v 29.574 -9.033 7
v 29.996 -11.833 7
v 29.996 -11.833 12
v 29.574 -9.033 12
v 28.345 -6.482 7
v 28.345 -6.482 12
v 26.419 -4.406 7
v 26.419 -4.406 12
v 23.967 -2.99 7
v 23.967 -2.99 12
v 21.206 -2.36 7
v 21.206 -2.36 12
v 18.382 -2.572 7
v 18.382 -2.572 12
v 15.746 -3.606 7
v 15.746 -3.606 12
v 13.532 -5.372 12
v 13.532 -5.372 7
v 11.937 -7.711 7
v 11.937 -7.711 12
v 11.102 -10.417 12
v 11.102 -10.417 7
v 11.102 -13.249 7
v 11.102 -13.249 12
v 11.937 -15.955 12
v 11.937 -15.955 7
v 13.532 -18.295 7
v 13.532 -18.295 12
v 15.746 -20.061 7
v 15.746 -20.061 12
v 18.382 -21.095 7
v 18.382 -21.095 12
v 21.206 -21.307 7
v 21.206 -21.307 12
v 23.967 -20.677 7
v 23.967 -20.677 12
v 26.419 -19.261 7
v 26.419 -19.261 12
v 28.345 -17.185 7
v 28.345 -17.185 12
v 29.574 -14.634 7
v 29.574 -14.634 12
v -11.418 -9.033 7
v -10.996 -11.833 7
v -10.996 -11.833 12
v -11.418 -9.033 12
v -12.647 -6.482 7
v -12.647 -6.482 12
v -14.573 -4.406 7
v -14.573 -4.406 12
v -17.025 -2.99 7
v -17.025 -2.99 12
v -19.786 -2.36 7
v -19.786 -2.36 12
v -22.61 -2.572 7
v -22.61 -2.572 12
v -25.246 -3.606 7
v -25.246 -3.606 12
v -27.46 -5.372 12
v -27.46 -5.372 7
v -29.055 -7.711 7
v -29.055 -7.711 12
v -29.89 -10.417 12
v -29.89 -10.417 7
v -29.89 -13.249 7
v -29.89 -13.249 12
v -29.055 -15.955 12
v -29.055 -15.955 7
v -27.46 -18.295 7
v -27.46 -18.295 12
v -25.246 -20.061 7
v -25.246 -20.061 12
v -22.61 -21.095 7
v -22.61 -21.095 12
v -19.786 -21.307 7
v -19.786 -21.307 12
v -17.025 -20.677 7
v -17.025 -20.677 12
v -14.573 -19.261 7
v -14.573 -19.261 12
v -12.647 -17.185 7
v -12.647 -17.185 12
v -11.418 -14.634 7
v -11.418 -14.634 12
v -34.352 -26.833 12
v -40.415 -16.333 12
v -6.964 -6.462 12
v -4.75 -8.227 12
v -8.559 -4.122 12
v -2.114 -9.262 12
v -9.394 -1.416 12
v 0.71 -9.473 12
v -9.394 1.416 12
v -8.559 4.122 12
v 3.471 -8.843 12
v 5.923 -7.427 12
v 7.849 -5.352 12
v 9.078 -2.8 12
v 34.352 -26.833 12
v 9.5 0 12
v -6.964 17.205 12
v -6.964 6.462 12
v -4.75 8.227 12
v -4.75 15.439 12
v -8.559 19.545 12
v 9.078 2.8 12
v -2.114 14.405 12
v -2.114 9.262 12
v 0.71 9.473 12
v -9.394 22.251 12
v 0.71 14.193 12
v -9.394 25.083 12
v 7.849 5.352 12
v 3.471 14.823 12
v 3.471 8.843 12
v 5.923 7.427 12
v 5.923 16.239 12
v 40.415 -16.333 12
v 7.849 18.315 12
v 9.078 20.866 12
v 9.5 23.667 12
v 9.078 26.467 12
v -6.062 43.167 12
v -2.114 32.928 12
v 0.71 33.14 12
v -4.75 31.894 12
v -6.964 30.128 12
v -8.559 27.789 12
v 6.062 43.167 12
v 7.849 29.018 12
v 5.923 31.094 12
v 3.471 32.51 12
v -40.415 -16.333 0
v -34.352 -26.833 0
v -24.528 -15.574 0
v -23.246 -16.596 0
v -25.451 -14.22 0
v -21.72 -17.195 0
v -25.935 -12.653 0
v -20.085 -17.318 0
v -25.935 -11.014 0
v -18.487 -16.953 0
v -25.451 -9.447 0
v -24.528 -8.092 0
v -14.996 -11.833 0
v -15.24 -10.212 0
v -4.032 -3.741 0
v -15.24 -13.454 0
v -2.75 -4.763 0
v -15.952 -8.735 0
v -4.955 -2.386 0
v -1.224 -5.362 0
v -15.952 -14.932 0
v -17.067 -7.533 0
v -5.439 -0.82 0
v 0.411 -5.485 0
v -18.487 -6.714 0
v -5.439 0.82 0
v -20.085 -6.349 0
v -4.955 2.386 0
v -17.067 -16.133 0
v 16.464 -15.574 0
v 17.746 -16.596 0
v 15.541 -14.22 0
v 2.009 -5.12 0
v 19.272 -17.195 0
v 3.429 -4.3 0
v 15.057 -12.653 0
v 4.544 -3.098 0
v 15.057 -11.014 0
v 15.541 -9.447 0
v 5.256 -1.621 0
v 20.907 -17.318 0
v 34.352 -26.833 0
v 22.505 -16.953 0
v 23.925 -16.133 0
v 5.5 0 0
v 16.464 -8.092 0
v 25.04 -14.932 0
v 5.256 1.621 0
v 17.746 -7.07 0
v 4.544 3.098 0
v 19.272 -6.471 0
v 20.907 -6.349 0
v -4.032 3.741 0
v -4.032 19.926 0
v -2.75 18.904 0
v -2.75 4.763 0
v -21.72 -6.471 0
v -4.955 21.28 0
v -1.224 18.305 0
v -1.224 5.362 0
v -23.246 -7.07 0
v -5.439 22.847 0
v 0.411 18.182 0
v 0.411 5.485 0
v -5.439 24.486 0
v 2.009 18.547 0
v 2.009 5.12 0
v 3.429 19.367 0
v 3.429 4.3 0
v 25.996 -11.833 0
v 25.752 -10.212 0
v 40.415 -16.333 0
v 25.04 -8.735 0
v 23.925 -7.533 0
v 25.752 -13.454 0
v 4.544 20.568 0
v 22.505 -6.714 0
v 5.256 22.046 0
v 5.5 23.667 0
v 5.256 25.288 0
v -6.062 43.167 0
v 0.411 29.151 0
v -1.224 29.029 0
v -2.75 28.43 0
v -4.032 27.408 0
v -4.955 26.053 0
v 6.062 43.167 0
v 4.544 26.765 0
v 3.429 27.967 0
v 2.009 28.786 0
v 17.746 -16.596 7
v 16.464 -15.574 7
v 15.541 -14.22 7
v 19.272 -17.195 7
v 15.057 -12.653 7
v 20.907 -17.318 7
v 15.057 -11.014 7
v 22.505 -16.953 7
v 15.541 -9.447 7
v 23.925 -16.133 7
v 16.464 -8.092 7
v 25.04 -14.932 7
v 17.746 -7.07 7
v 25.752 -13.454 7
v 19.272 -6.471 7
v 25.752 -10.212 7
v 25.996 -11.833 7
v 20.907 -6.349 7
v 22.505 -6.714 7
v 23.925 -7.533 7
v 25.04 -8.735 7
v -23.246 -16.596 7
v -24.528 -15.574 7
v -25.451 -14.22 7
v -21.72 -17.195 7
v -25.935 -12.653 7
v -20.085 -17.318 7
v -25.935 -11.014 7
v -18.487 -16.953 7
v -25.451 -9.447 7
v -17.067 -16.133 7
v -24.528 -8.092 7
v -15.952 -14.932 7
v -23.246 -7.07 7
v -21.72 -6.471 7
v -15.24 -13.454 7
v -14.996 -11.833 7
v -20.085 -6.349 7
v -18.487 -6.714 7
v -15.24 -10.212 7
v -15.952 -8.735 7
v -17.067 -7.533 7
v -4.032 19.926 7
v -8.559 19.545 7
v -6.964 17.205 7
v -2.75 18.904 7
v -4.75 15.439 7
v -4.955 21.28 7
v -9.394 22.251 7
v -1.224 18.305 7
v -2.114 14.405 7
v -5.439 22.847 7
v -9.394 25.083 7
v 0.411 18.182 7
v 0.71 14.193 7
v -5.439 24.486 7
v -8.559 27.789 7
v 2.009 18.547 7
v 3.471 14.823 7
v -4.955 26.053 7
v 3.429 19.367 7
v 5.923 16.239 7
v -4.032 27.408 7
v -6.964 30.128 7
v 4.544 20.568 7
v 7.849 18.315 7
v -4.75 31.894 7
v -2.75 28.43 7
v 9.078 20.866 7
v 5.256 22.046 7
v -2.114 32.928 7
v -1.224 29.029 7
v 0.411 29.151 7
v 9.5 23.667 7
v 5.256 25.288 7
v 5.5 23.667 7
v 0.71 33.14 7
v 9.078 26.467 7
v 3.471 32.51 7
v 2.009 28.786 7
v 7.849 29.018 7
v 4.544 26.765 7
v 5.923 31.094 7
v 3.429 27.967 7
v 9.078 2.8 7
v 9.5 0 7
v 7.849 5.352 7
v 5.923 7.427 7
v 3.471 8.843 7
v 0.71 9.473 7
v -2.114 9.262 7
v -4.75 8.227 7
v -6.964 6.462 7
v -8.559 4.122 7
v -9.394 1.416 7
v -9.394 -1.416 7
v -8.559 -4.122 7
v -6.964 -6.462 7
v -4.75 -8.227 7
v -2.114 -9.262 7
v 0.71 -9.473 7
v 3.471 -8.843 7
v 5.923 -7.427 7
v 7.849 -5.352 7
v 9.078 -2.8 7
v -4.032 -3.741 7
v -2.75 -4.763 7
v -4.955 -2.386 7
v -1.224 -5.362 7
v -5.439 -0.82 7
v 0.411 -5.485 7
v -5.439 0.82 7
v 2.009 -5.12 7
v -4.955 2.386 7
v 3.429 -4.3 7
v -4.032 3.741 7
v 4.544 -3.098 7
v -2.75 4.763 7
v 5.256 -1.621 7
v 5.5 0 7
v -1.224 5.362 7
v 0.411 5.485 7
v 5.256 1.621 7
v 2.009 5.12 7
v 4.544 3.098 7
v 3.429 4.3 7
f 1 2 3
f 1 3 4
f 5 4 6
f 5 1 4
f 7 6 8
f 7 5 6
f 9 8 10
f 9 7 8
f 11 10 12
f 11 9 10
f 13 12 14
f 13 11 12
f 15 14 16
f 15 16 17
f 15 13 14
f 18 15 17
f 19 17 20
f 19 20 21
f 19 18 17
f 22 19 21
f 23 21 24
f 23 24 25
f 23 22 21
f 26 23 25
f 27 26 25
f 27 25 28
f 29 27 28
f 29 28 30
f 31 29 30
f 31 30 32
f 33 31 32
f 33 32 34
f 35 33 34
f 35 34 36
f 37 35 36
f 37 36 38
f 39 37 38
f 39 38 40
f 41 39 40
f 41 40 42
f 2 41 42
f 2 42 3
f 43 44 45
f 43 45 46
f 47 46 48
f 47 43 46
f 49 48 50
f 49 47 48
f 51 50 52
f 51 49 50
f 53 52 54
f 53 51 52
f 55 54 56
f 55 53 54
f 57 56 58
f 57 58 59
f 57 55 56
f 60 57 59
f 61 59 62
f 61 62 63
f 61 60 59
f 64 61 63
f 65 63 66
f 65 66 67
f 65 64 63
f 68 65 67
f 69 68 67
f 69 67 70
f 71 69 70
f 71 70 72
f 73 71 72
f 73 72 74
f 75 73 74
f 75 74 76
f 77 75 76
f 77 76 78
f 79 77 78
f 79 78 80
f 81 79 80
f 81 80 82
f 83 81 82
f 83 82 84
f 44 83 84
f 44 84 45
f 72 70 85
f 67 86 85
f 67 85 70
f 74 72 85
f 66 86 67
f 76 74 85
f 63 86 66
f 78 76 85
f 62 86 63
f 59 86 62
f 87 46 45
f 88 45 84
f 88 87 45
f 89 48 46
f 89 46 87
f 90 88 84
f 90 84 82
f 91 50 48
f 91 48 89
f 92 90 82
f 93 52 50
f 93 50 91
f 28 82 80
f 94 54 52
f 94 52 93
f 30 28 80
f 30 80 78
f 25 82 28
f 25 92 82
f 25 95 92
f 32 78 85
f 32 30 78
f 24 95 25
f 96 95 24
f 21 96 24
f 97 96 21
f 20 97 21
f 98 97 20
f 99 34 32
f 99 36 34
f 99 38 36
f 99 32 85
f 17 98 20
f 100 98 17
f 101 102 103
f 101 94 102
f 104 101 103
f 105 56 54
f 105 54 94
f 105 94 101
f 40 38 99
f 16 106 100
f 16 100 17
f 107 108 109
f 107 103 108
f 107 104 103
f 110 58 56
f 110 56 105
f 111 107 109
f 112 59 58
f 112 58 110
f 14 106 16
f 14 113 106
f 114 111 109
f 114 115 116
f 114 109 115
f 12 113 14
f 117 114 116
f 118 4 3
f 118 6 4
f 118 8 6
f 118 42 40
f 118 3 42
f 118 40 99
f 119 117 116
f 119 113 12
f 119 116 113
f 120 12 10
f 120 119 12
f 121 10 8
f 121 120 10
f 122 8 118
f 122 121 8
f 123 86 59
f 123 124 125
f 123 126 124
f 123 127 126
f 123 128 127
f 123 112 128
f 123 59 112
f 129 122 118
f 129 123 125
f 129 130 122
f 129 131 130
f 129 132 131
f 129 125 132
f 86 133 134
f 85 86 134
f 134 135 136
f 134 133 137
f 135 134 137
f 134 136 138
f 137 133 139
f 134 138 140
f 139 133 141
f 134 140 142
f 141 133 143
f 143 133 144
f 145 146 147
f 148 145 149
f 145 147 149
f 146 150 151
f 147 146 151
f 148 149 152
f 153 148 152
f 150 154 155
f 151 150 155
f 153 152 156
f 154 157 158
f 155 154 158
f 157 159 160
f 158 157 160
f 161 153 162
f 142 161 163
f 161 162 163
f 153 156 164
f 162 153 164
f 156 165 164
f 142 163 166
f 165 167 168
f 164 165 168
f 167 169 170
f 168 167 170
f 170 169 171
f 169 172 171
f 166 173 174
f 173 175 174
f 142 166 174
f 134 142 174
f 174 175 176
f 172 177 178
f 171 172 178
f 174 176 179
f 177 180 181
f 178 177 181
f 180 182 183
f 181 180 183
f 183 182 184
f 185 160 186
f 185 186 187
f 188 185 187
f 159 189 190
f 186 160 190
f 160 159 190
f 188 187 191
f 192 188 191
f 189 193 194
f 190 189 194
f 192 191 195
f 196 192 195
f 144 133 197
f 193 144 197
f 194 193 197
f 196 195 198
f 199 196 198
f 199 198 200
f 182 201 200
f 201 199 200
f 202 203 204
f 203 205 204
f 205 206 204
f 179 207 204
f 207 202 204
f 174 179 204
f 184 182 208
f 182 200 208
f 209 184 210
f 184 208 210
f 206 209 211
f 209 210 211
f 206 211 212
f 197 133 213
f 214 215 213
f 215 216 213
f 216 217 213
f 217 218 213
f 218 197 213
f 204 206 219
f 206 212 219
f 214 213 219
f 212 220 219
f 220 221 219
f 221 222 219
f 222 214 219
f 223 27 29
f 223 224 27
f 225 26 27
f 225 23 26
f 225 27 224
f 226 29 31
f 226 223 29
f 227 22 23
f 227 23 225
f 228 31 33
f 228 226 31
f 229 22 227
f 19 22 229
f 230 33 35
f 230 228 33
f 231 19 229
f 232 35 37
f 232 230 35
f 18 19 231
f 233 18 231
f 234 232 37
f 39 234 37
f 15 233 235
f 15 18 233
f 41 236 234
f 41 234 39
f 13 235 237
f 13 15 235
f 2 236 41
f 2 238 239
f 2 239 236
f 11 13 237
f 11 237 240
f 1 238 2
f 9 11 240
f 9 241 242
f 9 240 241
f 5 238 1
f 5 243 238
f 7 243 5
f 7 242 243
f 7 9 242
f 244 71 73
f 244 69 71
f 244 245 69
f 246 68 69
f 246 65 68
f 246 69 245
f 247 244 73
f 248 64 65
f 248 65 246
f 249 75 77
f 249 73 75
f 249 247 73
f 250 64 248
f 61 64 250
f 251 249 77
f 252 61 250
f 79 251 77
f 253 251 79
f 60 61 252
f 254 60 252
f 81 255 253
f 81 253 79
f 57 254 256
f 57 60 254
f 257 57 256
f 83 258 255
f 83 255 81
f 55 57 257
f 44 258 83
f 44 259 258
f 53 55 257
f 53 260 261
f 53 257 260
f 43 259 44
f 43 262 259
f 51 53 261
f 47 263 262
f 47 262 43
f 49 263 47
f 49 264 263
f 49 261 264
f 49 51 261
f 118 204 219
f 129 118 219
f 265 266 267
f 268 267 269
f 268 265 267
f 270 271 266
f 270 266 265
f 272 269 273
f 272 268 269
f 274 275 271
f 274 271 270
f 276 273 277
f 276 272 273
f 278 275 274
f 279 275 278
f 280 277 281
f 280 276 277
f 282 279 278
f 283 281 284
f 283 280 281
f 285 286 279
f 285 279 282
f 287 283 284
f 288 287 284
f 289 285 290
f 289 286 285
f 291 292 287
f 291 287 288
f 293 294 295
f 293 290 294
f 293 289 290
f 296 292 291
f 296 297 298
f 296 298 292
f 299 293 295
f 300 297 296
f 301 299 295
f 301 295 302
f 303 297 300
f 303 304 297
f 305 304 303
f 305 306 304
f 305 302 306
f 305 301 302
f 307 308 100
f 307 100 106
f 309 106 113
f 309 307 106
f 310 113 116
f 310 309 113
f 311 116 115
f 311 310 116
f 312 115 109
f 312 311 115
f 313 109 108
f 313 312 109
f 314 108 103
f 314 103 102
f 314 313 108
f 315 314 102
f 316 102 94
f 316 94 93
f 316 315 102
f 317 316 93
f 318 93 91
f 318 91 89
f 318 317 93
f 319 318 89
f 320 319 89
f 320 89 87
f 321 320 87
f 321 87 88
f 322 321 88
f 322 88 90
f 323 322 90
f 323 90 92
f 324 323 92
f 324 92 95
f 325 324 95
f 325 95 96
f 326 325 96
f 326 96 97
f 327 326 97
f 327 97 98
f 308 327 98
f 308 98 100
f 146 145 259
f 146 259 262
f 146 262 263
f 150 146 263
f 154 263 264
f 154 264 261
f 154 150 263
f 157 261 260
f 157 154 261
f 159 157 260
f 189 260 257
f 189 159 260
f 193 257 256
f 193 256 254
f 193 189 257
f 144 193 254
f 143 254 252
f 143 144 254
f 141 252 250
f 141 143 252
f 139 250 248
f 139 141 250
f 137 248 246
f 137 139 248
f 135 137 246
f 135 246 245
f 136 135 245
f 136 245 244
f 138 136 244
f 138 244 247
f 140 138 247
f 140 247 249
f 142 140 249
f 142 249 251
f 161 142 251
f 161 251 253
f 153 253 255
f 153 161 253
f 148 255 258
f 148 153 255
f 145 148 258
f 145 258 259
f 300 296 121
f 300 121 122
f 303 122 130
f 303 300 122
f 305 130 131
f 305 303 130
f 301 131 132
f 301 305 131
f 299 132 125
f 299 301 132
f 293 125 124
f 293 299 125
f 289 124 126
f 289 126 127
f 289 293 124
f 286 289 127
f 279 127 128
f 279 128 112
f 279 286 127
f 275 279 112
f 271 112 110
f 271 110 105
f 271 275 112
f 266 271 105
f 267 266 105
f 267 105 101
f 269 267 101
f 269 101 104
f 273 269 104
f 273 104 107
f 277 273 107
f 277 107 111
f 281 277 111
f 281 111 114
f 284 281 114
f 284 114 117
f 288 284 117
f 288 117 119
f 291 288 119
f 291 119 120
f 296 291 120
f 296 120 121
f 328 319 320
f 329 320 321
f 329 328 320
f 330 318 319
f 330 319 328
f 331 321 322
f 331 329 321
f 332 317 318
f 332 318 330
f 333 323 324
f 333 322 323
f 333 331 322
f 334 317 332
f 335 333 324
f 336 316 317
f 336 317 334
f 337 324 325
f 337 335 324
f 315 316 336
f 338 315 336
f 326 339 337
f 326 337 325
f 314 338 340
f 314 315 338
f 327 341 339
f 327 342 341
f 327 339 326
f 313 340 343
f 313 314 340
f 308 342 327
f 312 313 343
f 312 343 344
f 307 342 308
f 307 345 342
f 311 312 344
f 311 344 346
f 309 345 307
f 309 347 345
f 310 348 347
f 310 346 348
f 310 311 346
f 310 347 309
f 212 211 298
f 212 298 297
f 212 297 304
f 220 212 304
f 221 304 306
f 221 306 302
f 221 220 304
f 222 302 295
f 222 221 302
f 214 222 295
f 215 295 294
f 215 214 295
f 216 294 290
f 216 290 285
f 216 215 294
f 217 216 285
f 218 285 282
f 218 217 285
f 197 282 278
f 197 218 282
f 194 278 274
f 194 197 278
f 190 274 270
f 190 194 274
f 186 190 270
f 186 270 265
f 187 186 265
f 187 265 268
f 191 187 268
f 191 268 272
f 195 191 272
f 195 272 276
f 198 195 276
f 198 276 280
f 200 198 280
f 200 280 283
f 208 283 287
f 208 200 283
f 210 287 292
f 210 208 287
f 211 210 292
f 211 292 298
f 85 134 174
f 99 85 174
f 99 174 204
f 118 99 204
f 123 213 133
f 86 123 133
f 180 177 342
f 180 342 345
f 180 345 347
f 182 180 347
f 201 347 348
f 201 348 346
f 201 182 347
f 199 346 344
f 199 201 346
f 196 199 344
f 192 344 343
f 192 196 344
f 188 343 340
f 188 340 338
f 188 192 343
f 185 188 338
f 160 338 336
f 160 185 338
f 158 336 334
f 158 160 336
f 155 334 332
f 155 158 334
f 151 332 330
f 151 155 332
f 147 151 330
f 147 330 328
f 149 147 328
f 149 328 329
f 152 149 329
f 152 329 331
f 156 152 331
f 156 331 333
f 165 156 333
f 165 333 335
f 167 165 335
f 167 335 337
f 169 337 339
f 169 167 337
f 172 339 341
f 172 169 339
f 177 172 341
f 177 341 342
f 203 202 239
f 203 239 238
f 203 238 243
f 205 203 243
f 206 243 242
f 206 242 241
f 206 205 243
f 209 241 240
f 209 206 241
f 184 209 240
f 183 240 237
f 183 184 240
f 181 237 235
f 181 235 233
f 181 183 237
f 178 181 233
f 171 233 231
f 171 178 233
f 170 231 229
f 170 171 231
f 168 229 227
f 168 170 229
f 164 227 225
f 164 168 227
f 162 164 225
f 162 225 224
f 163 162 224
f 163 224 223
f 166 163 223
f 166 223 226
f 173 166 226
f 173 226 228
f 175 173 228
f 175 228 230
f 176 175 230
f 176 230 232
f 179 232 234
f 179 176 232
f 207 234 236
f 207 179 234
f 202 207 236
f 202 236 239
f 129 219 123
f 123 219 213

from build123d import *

# Parameters (mm, degrees)
F1_R     = 9.5
F1_R_2   = 5.5
F2_DEPTH = 7
F3_DEPTH = 12


# Not quite as in the source:
# - a feature of the source that left no trace in its solid (it failed there, or was rolled back) is left out


with BuildPart() as f2:
    # F1 (on Top) → F2 (new body)
    with BuildSketch(Plane.XY):
        Polygon((-6.0621778265, 43.1666666667), (-40.4145188433, -16.3333333333), (-34.3523410168, -26.8333333333), (34.3523410168, -26.8333333333), (40.4145188433, -16.3333333333), (6.0621778265, 43.1666666667), align=None)
        with Locations((-20.4959345562, -11.8333333333)):
            Circle(F1_R, mode=Mode.SUBTRACT)
        with Locations((20.4959345562, -11.8333333333)):
            Circle(F1_R, mode=Mode.SUBTRACT)
        Circle(F1_R, mode=Mode.SUBTRACT)
        with Locations((0, 23.6666666667)):
            Circle(F1_R, mode=Mode.SUBTRACT)
        with Locations((0, 23.6666666667)):
            Circle(F1_R)
        with Locations((0, 23.6666666667)):
            Circle(F1_R_2, mode=Mode.SUBTRACT)
        with Locations((-20.4959345562, -11.8333333333)):
            Circle(F1_R)
        with Locations((-20.4959345562, -11.8333333333)):
            Circle(F1_R_2, mode=Mode.SUBTRACT)
        Circle(F1_R)
        Circle(F1_R_2, mode=Mode.SUBTRACT)
        with Locations((20.4959345562, -11.8333333333)):
            Circle(F1_R)
        with Locations((20.4959345562, -11.8333333333)):
            Circle(F1_R_2, mode=Mode.SUBTRACT)
    extrude(amount=F2_DEPTH)

    # F1 (on Top) → F3 (join)
    with BuildSketch(Plane.XY):
        Polygon((-6.0621778265, 43.1666666667), (-40.4145188433, -16.3333333333), (-34.3523410168, -26.8333333333), (34.3523410168, -26.8333333333), (40.4145188433, -16.3333333333), (6.0621778265, 43.1666666667), align=None)
        with Locations((-20.4959345562, -11.8333333333)):
            Circle(F1_R, mode=Mode.SUBTRACT)
        with Locations((20.4959345562, -11.8333333333)):
            Circle(F1_R, mode=Mode.SUBTRACT)
        Circle(F1_R, mode=Mode.SUBTRACT)
        with Locations((0, 23.6666666667)):
            Circle(F1_R, mode=Mode.SUBTRACT)
    extrude(amount=F3_DEPTH)


solid = f2.part
